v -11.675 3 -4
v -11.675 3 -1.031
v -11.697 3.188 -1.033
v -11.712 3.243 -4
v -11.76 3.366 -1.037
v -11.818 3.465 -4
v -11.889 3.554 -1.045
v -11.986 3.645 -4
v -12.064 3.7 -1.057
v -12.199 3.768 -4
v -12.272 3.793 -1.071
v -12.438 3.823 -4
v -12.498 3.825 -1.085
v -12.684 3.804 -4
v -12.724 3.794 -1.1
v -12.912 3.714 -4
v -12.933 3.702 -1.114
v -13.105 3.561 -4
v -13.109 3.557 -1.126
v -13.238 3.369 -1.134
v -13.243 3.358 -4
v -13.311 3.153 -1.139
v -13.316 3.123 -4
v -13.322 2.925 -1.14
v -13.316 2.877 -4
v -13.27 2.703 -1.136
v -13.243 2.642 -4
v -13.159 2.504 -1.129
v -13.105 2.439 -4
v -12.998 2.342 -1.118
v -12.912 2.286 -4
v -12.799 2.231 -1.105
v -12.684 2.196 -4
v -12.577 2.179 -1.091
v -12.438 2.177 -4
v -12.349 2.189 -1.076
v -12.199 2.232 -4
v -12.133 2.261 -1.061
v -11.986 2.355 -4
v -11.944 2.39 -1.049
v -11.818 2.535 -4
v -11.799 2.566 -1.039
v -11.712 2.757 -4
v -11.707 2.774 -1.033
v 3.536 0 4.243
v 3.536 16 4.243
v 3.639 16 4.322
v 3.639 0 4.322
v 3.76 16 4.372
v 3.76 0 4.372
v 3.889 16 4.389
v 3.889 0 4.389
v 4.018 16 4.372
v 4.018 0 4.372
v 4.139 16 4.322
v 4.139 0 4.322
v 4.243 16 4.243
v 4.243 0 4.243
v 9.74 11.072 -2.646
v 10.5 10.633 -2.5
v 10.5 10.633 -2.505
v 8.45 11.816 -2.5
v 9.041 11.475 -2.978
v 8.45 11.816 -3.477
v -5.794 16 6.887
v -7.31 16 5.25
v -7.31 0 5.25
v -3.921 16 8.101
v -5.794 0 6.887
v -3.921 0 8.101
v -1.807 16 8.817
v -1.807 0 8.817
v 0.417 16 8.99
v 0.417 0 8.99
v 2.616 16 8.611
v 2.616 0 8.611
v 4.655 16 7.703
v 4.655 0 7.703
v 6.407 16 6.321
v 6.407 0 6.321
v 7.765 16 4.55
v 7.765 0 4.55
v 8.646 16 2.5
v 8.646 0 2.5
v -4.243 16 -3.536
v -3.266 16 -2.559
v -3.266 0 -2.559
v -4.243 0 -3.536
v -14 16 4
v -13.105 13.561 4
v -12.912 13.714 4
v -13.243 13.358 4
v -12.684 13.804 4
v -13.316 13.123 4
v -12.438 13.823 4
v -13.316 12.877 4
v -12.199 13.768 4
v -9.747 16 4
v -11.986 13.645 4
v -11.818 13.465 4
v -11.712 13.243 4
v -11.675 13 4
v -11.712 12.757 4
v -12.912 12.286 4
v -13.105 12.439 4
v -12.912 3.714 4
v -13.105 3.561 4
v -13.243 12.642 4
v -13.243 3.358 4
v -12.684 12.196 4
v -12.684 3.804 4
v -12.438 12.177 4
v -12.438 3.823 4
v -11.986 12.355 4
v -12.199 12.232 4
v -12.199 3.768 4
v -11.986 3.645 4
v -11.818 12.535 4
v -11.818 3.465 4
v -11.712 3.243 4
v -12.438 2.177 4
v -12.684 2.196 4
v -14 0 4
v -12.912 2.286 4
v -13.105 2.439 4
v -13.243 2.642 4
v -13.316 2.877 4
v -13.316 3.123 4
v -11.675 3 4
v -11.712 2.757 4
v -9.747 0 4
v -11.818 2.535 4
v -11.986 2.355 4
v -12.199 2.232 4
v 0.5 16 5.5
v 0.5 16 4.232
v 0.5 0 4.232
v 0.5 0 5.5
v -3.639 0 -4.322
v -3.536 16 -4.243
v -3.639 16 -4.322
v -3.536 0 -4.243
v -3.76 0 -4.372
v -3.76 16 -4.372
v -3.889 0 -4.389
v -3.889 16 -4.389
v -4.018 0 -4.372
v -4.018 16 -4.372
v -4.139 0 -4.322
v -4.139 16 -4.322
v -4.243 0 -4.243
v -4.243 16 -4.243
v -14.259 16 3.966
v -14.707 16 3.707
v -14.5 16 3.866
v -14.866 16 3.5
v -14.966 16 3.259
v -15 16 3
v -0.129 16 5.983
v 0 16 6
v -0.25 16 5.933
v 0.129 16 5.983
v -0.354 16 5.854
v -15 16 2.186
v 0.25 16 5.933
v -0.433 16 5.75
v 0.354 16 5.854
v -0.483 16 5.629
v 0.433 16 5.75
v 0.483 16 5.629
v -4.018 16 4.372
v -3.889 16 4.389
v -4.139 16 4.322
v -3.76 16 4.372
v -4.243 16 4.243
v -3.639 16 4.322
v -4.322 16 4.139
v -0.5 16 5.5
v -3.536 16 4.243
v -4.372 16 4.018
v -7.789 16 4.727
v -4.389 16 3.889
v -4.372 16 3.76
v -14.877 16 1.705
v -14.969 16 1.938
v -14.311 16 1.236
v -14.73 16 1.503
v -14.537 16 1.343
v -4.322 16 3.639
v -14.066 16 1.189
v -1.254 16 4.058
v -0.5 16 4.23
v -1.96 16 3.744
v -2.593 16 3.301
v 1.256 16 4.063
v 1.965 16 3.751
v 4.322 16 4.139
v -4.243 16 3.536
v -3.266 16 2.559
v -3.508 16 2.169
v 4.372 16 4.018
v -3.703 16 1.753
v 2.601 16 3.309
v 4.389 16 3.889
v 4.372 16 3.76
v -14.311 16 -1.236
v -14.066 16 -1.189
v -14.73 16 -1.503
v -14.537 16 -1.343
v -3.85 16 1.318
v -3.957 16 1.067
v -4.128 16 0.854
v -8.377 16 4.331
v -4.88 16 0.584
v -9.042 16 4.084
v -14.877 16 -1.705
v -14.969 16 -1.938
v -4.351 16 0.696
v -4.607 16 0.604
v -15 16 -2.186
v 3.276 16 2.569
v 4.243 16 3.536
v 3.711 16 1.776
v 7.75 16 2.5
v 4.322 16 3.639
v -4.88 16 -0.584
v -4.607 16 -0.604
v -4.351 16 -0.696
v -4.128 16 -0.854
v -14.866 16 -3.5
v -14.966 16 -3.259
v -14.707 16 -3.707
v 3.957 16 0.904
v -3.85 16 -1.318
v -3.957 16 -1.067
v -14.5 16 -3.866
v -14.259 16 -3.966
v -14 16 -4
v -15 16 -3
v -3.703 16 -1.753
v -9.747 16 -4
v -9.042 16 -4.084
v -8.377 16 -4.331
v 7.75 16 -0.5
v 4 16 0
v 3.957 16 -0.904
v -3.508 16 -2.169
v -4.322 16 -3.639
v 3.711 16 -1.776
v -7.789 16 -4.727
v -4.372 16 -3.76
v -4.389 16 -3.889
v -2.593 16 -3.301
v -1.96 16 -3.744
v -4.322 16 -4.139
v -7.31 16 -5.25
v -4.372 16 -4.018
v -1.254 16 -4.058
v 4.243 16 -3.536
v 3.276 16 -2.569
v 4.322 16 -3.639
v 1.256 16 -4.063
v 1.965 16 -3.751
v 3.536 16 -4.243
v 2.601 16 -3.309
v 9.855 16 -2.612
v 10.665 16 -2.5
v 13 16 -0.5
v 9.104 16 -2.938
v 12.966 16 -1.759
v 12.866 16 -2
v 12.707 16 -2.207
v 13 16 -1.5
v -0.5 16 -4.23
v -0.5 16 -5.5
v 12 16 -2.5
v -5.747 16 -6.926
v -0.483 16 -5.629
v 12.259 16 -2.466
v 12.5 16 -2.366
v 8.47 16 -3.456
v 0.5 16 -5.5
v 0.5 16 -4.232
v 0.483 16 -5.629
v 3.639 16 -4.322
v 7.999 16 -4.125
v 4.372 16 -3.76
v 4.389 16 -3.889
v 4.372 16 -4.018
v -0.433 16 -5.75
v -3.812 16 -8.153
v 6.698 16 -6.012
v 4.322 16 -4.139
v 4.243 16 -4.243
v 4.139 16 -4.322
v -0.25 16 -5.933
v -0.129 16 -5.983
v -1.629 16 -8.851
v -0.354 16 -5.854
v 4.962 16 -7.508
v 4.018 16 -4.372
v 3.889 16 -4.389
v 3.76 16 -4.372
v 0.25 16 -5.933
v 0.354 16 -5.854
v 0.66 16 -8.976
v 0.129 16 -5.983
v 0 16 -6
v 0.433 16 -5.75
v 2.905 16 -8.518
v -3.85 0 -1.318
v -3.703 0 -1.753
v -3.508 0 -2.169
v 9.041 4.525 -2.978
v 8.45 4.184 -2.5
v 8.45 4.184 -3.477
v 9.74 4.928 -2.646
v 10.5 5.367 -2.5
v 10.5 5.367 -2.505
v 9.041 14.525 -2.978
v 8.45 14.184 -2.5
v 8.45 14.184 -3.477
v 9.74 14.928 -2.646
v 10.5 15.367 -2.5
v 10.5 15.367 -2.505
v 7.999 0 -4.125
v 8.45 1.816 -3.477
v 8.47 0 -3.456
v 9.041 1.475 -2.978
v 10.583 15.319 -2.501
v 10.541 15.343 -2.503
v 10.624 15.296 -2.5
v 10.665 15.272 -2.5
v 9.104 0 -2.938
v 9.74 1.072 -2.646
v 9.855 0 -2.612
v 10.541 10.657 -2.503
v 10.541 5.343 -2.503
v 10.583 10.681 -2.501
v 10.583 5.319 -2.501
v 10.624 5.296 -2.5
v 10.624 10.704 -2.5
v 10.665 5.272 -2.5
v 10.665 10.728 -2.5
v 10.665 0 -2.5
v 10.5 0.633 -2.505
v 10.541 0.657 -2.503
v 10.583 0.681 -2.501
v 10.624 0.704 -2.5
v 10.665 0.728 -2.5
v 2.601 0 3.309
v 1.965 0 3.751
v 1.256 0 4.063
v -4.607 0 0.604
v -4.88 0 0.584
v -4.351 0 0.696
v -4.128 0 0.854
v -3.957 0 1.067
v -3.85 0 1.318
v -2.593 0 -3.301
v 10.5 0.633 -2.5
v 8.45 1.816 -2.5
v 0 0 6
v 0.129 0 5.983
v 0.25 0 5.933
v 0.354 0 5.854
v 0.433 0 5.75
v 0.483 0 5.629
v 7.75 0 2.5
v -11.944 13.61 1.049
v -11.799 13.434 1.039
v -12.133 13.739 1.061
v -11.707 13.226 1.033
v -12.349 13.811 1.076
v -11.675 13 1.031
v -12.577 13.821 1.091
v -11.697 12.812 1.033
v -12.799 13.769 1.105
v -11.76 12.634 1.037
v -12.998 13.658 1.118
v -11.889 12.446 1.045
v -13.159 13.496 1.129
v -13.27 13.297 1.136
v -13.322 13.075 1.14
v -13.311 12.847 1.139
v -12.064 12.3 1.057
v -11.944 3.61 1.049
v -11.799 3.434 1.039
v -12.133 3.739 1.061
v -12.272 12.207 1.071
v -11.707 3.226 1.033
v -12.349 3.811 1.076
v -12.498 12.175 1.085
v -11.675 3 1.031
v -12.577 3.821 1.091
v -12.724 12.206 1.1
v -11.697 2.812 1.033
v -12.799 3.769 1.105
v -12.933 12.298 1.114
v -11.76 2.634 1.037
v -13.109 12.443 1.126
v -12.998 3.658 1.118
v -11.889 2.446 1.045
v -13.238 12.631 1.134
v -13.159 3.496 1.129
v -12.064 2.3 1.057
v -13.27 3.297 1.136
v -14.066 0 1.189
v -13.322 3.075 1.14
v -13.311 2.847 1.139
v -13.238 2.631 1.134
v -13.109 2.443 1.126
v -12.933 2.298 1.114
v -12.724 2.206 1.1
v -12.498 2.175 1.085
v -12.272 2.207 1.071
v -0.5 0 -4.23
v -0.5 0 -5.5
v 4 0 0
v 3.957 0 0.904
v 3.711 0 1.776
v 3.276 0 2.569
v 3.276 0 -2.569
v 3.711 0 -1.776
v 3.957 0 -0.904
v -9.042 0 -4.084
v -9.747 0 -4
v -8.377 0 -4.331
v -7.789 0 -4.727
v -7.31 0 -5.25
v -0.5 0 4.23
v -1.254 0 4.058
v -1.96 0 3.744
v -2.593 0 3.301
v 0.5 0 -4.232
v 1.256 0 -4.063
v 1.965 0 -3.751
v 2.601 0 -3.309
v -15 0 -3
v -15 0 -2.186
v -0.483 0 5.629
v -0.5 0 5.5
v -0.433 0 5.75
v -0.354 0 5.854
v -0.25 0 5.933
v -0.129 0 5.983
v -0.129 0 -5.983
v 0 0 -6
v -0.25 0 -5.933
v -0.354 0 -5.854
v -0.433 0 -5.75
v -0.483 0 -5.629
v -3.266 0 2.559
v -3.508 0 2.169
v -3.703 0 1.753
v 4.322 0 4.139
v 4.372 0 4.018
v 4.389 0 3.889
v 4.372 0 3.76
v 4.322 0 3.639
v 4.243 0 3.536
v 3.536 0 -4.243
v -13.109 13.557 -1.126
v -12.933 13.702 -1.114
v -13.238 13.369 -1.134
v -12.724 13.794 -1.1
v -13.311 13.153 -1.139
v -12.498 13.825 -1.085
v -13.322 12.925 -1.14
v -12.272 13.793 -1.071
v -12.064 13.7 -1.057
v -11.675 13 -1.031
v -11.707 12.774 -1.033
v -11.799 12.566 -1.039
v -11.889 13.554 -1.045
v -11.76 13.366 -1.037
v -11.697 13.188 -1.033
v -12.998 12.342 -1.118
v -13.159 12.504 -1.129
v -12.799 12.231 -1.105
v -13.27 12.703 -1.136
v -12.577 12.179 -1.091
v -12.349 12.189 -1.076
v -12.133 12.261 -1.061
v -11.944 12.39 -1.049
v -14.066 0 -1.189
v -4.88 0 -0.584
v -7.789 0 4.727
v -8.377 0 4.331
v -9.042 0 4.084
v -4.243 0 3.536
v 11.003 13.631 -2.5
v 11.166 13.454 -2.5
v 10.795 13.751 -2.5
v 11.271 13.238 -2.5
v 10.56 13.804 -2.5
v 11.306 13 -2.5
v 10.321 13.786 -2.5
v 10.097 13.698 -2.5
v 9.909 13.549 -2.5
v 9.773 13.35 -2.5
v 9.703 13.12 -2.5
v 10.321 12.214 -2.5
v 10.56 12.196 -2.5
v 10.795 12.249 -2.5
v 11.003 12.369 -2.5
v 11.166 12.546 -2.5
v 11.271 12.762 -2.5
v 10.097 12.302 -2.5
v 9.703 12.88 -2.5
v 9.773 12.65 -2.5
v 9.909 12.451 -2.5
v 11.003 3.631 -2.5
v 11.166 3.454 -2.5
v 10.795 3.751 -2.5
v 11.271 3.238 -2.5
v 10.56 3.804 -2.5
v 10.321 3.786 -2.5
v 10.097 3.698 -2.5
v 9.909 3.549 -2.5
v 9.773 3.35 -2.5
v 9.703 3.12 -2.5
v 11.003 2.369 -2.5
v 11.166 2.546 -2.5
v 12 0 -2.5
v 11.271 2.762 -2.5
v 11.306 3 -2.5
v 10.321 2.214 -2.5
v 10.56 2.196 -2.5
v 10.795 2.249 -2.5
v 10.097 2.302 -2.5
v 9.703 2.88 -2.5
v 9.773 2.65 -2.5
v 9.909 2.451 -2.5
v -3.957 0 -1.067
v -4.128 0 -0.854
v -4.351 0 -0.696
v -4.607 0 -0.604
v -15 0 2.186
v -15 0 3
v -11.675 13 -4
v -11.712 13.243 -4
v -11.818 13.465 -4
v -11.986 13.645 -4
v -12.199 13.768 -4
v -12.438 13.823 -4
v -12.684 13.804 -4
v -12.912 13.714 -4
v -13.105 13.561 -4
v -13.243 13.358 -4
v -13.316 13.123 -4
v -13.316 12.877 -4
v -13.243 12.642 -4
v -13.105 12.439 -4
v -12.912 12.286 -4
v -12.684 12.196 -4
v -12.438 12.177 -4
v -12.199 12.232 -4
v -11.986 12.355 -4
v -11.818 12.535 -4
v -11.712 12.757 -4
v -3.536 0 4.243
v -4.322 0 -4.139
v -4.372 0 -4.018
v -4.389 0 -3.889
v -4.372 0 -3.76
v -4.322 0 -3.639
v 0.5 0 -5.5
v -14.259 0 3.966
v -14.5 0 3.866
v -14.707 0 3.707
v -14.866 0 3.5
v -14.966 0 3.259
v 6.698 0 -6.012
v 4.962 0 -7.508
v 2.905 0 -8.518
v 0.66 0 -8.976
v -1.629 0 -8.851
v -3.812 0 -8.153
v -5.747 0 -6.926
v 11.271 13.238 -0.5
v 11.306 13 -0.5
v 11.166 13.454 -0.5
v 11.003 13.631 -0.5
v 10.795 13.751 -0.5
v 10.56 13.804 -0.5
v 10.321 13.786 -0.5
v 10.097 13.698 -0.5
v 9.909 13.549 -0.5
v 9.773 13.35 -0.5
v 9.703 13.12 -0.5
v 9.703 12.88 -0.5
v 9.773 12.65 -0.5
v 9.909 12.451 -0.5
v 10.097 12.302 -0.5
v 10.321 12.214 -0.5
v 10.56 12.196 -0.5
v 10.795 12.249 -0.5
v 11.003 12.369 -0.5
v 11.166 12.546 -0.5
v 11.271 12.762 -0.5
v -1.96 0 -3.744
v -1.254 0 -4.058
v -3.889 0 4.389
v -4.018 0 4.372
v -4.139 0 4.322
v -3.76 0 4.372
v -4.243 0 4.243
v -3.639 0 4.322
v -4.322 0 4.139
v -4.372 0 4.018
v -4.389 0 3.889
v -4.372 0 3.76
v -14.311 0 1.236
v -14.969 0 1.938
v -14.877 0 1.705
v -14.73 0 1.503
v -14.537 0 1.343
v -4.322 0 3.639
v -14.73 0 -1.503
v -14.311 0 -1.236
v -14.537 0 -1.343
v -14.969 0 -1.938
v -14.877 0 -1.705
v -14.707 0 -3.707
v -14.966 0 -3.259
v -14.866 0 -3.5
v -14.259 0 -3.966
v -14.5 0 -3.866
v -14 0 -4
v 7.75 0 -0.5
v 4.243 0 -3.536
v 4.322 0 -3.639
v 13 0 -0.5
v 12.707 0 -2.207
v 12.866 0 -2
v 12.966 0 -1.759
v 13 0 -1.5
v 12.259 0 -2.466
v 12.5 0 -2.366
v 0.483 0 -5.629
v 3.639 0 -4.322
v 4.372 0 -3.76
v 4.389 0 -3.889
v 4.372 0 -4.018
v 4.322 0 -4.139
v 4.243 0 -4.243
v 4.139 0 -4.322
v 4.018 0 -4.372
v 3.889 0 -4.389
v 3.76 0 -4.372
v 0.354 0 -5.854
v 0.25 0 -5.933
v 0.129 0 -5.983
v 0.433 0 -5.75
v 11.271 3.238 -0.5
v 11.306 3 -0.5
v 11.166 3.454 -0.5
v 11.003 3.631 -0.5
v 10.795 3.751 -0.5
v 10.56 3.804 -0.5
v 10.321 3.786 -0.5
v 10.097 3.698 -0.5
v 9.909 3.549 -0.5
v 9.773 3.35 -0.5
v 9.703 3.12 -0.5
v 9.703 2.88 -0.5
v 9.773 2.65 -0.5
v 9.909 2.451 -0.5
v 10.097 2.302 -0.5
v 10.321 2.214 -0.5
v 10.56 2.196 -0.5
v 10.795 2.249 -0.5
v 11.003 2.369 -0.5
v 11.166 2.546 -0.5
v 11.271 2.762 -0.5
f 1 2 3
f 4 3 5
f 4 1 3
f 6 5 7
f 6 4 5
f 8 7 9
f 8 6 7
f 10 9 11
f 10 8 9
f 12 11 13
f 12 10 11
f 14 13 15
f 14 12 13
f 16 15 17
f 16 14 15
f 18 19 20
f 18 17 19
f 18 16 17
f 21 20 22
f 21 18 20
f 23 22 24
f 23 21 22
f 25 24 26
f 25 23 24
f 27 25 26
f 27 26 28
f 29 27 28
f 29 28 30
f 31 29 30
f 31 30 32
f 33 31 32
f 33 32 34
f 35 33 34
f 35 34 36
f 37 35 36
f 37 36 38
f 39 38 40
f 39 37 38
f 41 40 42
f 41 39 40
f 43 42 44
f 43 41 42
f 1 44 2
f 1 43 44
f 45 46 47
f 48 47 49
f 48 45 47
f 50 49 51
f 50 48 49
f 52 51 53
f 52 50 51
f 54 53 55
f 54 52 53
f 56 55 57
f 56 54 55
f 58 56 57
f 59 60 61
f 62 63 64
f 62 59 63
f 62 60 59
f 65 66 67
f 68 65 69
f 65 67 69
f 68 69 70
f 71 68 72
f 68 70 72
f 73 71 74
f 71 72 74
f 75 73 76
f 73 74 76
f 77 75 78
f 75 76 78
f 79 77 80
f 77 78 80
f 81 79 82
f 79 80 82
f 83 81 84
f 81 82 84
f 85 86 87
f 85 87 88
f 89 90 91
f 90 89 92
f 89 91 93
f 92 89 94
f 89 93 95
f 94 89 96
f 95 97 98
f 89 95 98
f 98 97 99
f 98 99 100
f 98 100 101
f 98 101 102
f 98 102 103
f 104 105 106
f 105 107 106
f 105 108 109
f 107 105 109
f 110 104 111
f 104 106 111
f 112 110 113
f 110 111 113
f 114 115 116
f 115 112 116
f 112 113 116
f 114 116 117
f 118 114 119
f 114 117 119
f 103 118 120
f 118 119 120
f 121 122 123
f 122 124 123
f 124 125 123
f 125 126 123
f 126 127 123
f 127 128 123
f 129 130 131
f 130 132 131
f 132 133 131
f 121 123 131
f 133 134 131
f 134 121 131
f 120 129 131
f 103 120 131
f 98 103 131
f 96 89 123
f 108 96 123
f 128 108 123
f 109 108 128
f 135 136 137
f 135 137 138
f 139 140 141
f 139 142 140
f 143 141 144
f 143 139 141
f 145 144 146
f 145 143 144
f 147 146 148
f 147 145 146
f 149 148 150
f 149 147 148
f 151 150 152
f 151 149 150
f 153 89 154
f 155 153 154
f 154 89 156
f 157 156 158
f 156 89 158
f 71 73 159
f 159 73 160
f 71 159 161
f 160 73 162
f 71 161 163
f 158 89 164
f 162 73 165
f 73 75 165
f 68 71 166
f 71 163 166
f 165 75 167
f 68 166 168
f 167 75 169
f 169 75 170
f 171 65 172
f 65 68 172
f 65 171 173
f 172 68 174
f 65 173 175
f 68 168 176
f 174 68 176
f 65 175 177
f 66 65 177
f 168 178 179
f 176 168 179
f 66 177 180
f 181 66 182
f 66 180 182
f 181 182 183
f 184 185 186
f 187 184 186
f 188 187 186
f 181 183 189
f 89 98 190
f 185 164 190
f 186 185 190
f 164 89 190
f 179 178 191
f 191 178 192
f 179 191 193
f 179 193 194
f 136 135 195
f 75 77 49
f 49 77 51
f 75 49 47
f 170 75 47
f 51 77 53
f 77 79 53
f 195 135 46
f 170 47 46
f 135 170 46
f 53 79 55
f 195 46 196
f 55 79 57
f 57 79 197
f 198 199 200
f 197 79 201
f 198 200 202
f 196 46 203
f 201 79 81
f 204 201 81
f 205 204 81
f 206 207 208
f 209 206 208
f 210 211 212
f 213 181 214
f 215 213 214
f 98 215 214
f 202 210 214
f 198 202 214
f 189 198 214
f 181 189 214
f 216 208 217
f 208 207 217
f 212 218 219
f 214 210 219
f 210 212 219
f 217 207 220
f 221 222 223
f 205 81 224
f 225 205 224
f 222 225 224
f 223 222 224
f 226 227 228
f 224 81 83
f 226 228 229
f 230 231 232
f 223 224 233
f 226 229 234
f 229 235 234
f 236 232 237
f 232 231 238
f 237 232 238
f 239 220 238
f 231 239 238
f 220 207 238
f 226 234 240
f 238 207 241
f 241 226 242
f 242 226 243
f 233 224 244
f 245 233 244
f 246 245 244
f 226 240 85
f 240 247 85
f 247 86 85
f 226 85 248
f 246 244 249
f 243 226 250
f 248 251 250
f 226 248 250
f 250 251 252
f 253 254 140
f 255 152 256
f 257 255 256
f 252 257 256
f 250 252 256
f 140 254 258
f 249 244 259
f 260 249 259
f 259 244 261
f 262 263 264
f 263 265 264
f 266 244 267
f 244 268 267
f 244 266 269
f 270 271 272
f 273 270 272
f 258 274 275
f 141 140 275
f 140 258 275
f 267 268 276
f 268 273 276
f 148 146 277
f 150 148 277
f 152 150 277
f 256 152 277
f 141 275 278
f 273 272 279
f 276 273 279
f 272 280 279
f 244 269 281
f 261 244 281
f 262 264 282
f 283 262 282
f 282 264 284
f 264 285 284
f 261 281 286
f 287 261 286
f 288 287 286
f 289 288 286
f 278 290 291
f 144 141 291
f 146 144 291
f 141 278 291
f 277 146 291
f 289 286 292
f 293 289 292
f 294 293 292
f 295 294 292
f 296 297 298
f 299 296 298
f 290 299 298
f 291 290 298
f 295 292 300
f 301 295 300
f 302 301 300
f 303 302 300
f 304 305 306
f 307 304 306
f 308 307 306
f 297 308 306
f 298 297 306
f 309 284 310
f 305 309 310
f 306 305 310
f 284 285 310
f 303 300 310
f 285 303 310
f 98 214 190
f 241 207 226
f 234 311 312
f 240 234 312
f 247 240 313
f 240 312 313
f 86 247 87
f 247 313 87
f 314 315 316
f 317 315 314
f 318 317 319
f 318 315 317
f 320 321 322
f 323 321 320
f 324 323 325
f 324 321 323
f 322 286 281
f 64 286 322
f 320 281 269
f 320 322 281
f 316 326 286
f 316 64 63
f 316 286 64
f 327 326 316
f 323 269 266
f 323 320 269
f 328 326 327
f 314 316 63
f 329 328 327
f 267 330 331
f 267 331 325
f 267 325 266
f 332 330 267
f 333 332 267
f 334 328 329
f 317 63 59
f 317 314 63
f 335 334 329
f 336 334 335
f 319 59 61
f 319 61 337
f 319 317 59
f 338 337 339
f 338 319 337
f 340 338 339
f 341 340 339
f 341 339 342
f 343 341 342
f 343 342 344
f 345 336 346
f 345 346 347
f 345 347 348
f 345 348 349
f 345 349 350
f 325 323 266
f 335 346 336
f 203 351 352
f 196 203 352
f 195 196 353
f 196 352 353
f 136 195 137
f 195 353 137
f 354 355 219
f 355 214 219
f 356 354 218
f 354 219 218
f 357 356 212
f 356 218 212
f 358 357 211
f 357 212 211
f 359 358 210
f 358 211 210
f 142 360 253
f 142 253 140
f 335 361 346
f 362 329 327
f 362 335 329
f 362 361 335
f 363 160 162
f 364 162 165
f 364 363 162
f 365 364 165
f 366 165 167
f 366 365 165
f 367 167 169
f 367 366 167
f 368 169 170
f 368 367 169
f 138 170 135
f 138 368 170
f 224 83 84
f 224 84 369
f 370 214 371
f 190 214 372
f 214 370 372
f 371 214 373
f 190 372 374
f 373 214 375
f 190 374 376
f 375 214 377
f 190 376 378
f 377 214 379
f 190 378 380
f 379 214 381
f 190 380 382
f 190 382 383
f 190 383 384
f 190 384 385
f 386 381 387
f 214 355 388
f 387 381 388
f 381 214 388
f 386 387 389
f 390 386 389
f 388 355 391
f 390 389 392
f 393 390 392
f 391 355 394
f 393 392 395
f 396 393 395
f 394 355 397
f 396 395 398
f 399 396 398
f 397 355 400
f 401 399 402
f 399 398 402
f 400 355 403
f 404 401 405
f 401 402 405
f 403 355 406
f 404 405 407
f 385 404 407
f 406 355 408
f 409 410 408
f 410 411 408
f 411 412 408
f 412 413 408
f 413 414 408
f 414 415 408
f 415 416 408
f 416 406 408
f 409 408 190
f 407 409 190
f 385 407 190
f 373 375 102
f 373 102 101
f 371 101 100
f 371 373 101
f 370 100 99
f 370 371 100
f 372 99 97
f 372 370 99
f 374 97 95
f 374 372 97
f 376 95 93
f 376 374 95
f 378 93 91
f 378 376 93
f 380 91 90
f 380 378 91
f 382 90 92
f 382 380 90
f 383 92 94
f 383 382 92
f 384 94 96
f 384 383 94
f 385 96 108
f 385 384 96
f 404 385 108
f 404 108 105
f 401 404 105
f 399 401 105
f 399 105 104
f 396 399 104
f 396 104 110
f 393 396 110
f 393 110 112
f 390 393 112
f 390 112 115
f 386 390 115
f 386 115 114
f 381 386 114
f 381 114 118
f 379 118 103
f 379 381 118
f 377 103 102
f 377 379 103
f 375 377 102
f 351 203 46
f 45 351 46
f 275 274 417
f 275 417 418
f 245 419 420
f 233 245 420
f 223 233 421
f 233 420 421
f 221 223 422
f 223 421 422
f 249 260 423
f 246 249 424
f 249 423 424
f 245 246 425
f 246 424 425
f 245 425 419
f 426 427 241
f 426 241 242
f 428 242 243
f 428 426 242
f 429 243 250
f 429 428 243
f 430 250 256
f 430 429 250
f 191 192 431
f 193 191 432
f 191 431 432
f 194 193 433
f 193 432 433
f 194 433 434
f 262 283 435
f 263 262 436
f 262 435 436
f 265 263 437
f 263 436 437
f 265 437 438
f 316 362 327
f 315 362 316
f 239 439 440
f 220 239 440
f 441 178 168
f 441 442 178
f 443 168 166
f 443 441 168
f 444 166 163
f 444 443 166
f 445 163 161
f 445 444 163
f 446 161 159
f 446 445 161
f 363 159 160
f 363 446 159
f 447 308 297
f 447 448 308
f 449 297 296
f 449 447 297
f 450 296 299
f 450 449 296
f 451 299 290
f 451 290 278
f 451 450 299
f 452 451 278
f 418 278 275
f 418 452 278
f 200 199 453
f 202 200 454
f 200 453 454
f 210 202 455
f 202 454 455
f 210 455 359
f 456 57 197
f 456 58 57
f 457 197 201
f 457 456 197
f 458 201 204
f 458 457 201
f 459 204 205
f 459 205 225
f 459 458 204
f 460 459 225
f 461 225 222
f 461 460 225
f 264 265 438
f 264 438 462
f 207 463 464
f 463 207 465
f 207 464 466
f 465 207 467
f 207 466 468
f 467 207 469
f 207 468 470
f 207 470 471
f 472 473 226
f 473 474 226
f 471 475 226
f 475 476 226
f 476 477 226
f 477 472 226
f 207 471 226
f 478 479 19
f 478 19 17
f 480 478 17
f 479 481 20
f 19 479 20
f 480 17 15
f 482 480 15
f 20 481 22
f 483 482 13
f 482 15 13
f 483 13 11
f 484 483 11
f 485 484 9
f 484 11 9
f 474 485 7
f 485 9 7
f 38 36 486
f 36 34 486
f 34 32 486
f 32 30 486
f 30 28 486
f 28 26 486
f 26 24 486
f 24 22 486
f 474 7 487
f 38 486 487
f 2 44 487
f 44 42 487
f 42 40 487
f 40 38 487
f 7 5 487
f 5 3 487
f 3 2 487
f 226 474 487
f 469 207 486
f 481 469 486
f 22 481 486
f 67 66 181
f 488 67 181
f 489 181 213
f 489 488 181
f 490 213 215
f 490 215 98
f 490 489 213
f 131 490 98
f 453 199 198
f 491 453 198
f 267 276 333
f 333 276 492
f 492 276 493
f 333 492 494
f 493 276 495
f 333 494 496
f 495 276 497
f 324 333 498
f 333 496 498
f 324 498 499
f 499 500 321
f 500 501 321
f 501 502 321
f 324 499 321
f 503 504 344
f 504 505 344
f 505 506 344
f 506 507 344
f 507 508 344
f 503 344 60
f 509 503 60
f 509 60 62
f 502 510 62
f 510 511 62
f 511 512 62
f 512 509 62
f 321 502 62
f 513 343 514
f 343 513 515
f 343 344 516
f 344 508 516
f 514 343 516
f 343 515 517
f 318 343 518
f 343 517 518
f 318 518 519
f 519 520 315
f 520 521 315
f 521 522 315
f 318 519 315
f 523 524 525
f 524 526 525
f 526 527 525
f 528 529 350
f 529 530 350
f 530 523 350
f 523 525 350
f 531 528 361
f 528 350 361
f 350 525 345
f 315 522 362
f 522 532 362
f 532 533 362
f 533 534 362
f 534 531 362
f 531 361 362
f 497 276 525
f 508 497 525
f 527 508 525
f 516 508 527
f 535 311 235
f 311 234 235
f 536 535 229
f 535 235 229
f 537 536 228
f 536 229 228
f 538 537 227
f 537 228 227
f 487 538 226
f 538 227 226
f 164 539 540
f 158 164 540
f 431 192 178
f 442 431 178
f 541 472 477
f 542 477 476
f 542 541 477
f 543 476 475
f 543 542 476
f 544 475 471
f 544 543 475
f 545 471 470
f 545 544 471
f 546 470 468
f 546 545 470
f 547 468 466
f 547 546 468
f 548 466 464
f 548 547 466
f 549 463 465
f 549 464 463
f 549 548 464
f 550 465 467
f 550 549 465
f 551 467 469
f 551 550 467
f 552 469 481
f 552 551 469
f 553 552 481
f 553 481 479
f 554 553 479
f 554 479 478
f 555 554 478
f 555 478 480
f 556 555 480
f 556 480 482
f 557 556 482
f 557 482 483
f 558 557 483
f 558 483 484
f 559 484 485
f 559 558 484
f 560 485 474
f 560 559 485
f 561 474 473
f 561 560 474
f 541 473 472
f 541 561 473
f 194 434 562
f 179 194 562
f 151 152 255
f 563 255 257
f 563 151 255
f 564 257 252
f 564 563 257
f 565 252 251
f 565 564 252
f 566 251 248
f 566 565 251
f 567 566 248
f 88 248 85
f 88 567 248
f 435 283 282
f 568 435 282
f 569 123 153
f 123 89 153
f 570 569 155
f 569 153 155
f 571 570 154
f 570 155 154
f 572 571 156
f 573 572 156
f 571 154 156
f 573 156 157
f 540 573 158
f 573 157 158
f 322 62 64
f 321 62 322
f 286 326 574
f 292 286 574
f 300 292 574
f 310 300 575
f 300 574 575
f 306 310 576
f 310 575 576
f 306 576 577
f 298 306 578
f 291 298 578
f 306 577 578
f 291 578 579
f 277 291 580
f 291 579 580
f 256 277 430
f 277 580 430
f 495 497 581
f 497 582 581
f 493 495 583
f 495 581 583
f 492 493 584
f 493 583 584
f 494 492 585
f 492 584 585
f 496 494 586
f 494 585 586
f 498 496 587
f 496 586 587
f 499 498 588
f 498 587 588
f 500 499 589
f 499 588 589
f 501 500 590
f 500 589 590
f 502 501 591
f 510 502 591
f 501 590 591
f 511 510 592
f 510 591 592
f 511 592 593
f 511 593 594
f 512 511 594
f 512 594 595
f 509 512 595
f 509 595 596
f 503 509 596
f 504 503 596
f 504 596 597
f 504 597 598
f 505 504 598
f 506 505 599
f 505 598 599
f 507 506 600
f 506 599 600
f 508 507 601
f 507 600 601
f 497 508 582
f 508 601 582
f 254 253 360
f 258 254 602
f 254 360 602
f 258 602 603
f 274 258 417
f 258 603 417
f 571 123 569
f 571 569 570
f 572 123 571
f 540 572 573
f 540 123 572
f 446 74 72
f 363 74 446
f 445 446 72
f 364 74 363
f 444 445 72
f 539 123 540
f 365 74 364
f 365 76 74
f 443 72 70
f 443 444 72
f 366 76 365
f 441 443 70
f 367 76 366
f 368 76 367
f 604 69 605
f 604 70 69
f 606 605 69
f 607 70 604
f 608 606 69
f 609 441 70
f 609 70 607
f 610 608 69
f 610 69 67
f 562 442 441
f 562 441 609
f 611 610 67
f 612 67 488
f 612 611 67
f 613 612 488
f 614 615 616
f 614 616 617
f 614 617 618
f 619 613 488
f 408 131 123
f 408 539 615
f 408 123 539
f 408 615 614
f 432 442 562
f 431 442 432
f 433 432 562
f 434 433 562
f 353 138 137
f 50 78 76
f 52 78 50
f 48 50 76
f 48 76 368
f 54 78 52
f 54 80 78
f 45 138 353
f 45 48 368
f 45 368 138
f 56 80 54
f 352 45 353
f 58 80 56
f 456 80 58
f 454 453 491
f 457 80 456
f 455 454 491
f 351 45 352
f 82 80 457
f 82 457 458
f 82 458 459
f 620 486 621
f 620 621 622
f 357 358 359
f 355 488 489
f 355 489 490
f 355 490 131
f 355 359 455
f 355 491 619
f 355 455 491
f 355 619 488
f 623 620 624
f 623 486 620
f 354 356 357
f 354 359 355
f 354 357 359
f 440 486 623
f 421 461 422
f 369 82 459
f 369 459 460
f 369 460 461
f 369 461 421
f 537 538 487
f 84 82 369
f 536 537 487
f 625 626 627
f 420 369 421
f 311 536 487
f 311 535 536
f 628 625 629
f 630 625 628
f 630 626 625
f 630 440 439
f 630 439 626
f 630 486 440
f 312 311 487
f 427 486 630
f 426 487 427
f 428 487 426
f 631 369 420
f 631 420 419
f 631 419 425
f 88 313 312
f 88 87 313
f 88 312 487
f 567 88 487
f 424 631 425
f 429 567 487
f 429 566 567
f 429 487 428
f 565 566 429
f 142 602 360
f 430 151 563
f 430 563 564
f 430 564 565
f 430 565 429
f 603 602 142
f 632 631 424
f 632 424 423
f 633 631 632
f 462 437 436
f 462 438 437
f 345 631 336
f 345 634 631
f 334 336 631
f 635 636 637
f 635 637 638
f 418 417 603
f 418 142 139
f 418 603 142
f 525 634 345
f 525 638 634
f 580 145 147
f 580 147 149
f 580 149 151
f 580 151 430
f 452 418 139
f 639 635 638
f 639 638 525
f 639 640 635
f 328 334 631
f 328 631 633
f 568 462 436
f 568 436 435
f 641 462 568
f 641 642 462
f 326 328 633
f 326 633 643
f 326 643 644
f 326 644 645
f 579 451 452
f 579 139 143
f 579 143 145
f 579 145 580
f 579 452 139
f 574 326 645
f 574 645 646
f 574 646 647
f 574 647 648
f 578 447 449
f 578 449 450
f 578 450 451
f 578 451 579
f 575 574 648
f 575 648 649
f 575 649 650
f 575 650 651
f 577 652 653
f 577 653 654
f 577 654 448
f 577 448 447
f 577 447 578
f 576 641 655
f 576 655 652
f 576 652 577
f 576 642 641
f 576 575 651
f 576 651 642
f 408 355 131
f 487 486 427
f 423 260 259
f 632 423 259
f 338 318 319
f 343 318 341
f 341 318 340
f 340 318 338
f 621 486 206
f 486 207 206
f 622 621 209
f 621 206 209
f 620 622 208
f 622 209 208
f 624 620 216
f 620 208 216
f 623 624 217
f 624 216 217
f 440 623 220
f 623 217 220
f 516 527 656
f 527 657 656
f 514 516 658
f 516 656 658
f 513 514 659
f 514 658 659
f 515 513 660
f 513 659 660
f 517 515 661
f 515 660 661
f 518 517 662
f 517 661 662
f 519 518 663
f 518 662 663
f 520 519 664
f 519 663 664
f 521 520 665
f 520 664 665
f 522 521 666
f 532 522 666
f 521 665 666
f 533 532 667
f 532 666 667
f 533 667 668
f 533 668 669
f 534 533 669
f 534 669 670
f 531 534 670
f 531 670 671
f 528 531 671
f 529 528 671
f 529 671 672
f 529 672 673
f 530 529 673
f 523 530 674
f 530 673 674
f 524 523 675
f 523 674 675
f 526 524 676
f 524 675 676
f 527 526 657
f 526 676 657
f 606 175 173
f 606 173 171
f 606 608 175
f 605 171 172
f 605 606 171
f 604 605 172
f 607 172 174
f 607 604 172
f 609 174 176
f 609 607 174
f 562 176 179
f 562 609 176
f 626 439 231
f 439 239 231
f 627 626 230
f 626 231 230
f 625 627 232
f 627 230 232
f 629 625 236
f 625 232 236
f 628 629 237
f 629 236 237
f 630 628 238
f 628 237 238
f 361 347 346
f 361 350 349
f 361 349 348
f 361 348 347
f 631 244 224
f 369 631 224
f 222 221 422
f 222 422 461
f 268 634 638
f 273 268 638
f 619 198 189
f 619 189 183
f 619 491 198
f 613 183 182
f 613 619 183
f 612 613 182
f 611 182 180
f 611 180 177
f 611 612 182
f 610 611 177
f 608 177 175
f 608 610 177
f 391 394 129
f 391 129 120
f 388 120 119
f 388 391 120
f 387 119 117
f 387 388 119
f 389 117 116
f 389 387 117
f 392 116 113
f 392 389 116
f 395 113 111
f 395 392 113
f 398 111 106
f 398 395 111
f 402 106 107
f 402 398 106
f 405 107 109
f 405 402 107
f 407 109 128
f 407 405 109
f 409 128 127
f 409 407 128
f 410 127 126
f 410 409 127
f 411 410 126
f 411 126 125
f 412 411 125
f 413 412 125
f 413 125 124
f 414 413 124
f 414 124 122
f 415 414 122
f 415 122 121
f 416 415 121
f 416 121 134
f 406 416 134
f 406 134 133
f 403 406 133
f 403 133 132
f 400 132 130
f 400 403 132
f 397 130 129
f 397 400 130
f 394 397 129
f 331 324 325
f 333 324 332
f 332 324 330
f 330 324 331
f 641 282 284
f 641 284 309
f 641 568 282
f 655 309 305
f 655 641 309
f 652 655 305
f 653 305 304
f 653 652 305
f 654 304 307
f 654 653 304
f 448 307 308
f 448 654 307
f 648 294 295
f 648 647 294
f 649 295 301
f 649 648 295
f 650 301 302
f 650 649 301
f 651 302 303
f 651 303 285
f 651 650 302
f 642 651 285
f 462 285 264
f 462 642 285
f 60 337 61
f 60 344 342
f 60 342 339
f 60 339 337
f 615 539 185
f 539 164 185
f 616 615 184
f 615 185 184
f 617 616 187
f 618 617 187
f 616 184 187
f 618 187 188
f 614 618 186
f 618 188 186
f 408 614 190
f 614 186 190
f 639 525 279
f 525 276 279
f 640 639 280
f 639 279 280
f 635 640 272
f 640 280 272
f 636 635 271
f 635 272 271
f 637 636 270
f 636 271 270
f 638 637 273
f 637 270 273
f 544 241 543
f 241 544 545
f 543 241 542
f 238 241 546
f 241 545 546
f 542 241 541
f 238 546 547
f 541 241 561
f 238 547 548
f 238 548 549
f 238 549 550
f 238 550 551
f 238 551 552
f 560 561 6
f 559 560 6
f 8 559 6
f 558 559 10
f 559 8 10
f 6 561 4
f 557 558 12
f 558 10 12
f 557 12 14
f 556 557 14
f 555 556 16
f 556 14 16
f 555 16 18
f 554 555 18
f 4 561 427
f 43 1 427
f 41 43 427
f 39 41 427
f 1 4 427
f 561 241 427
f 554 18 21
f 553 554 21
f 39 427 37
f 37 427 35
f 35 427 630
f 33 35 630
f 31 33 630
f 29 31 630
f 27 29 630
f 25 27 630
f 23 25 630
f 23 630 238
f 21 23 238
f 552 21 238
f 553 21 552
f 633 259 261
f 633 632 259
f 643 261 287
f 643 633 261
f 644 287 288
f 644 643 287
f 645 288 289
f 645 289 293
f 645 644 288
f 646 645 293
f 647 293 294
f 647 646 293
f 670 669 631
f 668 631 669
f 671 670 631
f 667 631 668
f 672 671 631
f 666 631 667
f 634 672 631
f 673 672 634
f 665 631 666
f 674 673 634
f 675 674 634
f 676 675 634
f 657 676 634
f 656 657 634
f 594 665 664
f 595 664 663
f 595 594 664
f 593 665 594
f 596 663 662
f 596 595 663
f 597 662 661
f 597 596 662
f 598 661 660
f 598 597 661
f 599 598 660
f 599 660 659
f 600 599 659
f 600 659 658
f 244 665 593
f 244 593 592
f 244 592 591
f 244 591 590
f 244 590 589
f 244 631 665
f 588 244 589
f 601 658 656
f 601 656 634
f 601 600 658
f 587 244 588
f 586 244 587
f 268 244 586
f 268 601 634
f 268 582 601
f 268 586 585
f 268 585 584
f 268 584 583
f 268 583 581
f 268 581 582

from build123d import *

# Parameters (mm, degrees)
BOSS_EXTRUDE1_DEPTH      = 16
SKETCH2_W                = 1
SKETCH2_H                = 5
CUT_EXTRUDE1_DEPTH       = 24.706539182
FILLET1_R                = 0.5
CIRPATTERN1_COUNT        = 8
FILLET1_OF_CIRPATTERN1_R = 0.5
CUT_EXTRUDE2_DEPTH       = 24.706539182
CUT_EXTRUDE3_DEPTH       = 24.900836805
CUT_EXTRUDE3_DEPTH_BACK  = 24.900836805
SKETCH5_R                = 0.80645
SKETCH5_R_2              = 0.825
FILLET2_R                = 1
FILLET3_R                = 3
CUT_EXTRUDE5_DEPTH       = 10


# Some blends are built 0.0001 mm under size
with BuildPart() as part:
    # Sketch1 → Boss-Extrude1 (new body)
    with BuildSketch(Plane(origin=(0, 0, 0), x_dir=(1, 0, 0), z_dir=(0, 1, 0))):
        with BuildLine():
            Line((-3.98274298, -0.525180459), (-15, -1.25))
            Line((-15, -1.25), (-15, -4))
            Line((-15, -4), (-8.062257748, -4))
            ThreePointArc((-8.062257748, -4), (0.804756356, -8.963948193), (8.645808233, -2.5))
            Line((8.645808233, -2.5), (13, -2.5))
            Line((13, -2.5), (13, 2.5))
            Line((13, 2.5), (8.645808233, 2.5))
            ThreePointArc((8.645808233, 2.5), (0.804756356, 8.963948193), (-8.062257748, 4))
            Line((-8.062257748, 4), (-15, 4))
            Line((-15, 4), (-15, 1.25))
            Line((-15, 1.25), (-3.98274298, 0.525180459))
            ThreePointArc((-3.98274298, 0.525180459), (0.27121874, 4.25396172), (4, 0))
            ThreePointArc((4, 0), (0.27121874, -4.25396172), (-3.98274298, -0.525180459))
        make_face()
    extrude(amount=BOSS_EXTRUDE1_DEPTH)

    # Sketch2 → Cut-Extrude1 (cut, through all)
    with BuildSketch(Plane(origin=(0, 16, 0), x_dir=(1, 0, 0), z_dir=(0, 1, 0))):
        with Locations((0, 3.5)):
            Rectangle(SKETCH2_W, SKETCH2_H)
    cut_extrude1 = extrude(amount=-CUT_EXTRUDE1_DEPTH, mode=Mode.SUBTRACT)

    # Fillet1
    fillet1_edges = [part.edges().sort_by_distance(p)[0] for p in [
        (-0.5, 8, -6),
        (0.5, 8, -6),
    ]]
    fillet(fillet1_edges, radius=FILLET1_R - 0.0001)  # a hair under: the kernel refuses the full size

    # CirPattern1: Cut-Extrude1 ×8 about axis, 2 skipped
    cirpattern1_axis = Axis((0, 0, 0), (0, -1, 0))
    add([cut_extrude1.rotate(cirpattern1_axis, i * 360 / CIRPATTERN1_COUNT) for i in range(1, CIRPATTERN1_COUNT) if i not in (2, 6)], mode=Mode.SUBTRACT)

    # Fillet1 of CirPattern1
    fillet1_of_cirpattern1_edges = [part.edges().sort_by_distance(p)[0] for p in [
        (3.889087297, 8, -4.596194078),
        (4.596194078, 8, -3.889087297),
        (4.596194078, 8, 3.889087297),
        (3.889087297, 8, 4.596194078),
        (0.5, 8, 6),
        (-0.5, 8, 6),
        (-3.889087297, 8, 4.596194078),
        (-4.596194078, 8, 3.889087297),
        (-4.596194078, 8, -3.889087297),
        (-3.889087297, 8, -4.596194078),
    ]]
    fillet(fillet1_of_cirpattern1_edges, radius=FILLET1_OF_CIRPATTERN1_R - 0.0001)  # a hair under: the kernel refuses the full size

    # Sketch4 → Cut-Extrude2 (cut, through all)
    with BuildSketch(Plane(origin=(0, 16, 0), x_dir=(1, 0, 0), z_dir=(0, 1, 0))):
        Polygon((7.75, -0.5), (7.75, 0.5), (13, 0.5), (13, -0.5), (13, -2.5), (7.75, -2.5), align=None)
    extrude(amount=-CUT_EXTRUDE2_DEPTH, mode=Mode.SUBTRACT)

    # Sketch5 → Cut-Extrude3 (cut, two sides: drawn at the far end of the back side and taken through both)
    with BuildSketch(Plane.XY.offset(-0.5).offset(-CUT_EXTRUDE3_DEPTH_BACK)):
        with Locations((10.5, 13)):
            Circle(SKETCH5_R)
        with Locations((10.5, 3)):
            Circle(SKETCH5_R)
        with Locations((-12.5, 13)):
            Circle(SKETCH5_R_2)
        with Locations((-12.5, 3)):
            Circle(SKETCH5_R_2)
    extrude(amount=CUT_EXTRUDE3_DEPTH + CUT_EXTRUDE3_DEPTH_BACK, mode=Mode.SUBTRACT)

    # Fillet2
    fillet2_edges = [part.edges().sort_by_distance(p)[0] for p in [
        (-3.98274298, 8, -0.525180459),
        (-15, 8, -1.25),
        (-15, 8, -4),
        (13, 8, -2.5),
        (-15, 8, 4),
        (-15, 8, 1.25),
        (-3.98274298, 8, 0.525180459),
    ]]
    fillet(fillet2_edges, radius=FILLET2_R)

    # Fillet3
    # the kernel refuses this fillet: 3 mm, written as the material it adds along each edge
    with BuildSketch(Plane(origin=(-8.062257748, 0, -4), x_dir=(-1, 0, 0), z_dir=(0, 1, 0))) as fillet3_piece_1:
        with BuildLine():
            CenterArc((1.684536597, -3), FILLET3_R, 90, 54.314665287)
            ThreePointArc((-0.75216199, -1.25), (-0.350711983, -0.640265285), (0, 0))
            Line((0, 0), (1.684536597, 0))
        make_face()
    extrude(amount=16)
    with BuildSketch(Plane(origin=(8.645808233, 0, -2.5), x_dir=(-0.36980540281703944, 0, -0.9291092314939762), z_dir=(0, 1, 0))) as fillet3_piece_2_section:
        with BuildLine():
            CenterArc((2.040484874, -2.985804583), FILLET3_R, 95.575996261, 62.720387264)
            Line((-0.74684282, -1.876388375), (0, 0))
            ThreePointArc((0, 0), (0.874493518, -0.04258625), (1.748987035, 0))
        make_face()
    fillet3_piece_2 = extrude(amount=16, mode=Mode.PRIVATE)
    fillet3_piece_2 = fillet3_piece_2 - Plane(origin=(10.5, 13, -2.86106774), x_dir=(1, 0, 0), z_dir=(0, 0, 1)) * Cylinder(0.80645, 40, mode=Mode.PRIVATE)
    fillet3_piece_2 = fillet3_piece_2 - Plane(origin=(10.5, 3, -2.86106774), x_dir=(1, 0, 0), z_dir=(0, 0, 1)) * Cylinder(0.80645, 40, mode=Mode.PRIVATE)
    add(fillet3_piece_2)
    with BuildSketch(Plane(origin=(-8.062257748, 0, 4), x_dir=(0.5155850316607751, 0, 0.8568384183306427), z_dir=(0, 1, 0))) as fillet3_piece_3:
        with BuildLine():
            CenterArc((1.701993401, -2.990130768), FILLET3_R, 94.648767376, 54.314665287)
            Line((-0.868521854, -1.443375673), (0, 0))
            ThreePointArc((0, 0), (0.729425743, -0.029607696), (1.458851486, 0))
        make_face()
    extrude(amount=16)

    # Sketch7 → Cut-Extrude5 (cut)
    with BuildSketch(Plane(origin=(0, 0, -2.5), x_dir=(-1, 0, 0), z_dir=(0, 0, -1))):
        Polygon((-10.5, 15.367136104), (-12.55, 14.183568052), (-12.55, 11.816431948), (-10.5, 10.632863896), (-8.45, 11.816431948), (-8.45, 14.183568052), align=None)
        Polygon((-10.5, 5.367136104), (-12.55, 4.183568052), (-12.55, 1.816431948), (-10.5, 0.632863896), (-8.45, 1.816431948), (-8.45, 4.183568052), align=None)
    extrude(amount=CUT_EXTRUDE5_DEPTH, mode=Mode.SUBTRACT)


solid = part.part
